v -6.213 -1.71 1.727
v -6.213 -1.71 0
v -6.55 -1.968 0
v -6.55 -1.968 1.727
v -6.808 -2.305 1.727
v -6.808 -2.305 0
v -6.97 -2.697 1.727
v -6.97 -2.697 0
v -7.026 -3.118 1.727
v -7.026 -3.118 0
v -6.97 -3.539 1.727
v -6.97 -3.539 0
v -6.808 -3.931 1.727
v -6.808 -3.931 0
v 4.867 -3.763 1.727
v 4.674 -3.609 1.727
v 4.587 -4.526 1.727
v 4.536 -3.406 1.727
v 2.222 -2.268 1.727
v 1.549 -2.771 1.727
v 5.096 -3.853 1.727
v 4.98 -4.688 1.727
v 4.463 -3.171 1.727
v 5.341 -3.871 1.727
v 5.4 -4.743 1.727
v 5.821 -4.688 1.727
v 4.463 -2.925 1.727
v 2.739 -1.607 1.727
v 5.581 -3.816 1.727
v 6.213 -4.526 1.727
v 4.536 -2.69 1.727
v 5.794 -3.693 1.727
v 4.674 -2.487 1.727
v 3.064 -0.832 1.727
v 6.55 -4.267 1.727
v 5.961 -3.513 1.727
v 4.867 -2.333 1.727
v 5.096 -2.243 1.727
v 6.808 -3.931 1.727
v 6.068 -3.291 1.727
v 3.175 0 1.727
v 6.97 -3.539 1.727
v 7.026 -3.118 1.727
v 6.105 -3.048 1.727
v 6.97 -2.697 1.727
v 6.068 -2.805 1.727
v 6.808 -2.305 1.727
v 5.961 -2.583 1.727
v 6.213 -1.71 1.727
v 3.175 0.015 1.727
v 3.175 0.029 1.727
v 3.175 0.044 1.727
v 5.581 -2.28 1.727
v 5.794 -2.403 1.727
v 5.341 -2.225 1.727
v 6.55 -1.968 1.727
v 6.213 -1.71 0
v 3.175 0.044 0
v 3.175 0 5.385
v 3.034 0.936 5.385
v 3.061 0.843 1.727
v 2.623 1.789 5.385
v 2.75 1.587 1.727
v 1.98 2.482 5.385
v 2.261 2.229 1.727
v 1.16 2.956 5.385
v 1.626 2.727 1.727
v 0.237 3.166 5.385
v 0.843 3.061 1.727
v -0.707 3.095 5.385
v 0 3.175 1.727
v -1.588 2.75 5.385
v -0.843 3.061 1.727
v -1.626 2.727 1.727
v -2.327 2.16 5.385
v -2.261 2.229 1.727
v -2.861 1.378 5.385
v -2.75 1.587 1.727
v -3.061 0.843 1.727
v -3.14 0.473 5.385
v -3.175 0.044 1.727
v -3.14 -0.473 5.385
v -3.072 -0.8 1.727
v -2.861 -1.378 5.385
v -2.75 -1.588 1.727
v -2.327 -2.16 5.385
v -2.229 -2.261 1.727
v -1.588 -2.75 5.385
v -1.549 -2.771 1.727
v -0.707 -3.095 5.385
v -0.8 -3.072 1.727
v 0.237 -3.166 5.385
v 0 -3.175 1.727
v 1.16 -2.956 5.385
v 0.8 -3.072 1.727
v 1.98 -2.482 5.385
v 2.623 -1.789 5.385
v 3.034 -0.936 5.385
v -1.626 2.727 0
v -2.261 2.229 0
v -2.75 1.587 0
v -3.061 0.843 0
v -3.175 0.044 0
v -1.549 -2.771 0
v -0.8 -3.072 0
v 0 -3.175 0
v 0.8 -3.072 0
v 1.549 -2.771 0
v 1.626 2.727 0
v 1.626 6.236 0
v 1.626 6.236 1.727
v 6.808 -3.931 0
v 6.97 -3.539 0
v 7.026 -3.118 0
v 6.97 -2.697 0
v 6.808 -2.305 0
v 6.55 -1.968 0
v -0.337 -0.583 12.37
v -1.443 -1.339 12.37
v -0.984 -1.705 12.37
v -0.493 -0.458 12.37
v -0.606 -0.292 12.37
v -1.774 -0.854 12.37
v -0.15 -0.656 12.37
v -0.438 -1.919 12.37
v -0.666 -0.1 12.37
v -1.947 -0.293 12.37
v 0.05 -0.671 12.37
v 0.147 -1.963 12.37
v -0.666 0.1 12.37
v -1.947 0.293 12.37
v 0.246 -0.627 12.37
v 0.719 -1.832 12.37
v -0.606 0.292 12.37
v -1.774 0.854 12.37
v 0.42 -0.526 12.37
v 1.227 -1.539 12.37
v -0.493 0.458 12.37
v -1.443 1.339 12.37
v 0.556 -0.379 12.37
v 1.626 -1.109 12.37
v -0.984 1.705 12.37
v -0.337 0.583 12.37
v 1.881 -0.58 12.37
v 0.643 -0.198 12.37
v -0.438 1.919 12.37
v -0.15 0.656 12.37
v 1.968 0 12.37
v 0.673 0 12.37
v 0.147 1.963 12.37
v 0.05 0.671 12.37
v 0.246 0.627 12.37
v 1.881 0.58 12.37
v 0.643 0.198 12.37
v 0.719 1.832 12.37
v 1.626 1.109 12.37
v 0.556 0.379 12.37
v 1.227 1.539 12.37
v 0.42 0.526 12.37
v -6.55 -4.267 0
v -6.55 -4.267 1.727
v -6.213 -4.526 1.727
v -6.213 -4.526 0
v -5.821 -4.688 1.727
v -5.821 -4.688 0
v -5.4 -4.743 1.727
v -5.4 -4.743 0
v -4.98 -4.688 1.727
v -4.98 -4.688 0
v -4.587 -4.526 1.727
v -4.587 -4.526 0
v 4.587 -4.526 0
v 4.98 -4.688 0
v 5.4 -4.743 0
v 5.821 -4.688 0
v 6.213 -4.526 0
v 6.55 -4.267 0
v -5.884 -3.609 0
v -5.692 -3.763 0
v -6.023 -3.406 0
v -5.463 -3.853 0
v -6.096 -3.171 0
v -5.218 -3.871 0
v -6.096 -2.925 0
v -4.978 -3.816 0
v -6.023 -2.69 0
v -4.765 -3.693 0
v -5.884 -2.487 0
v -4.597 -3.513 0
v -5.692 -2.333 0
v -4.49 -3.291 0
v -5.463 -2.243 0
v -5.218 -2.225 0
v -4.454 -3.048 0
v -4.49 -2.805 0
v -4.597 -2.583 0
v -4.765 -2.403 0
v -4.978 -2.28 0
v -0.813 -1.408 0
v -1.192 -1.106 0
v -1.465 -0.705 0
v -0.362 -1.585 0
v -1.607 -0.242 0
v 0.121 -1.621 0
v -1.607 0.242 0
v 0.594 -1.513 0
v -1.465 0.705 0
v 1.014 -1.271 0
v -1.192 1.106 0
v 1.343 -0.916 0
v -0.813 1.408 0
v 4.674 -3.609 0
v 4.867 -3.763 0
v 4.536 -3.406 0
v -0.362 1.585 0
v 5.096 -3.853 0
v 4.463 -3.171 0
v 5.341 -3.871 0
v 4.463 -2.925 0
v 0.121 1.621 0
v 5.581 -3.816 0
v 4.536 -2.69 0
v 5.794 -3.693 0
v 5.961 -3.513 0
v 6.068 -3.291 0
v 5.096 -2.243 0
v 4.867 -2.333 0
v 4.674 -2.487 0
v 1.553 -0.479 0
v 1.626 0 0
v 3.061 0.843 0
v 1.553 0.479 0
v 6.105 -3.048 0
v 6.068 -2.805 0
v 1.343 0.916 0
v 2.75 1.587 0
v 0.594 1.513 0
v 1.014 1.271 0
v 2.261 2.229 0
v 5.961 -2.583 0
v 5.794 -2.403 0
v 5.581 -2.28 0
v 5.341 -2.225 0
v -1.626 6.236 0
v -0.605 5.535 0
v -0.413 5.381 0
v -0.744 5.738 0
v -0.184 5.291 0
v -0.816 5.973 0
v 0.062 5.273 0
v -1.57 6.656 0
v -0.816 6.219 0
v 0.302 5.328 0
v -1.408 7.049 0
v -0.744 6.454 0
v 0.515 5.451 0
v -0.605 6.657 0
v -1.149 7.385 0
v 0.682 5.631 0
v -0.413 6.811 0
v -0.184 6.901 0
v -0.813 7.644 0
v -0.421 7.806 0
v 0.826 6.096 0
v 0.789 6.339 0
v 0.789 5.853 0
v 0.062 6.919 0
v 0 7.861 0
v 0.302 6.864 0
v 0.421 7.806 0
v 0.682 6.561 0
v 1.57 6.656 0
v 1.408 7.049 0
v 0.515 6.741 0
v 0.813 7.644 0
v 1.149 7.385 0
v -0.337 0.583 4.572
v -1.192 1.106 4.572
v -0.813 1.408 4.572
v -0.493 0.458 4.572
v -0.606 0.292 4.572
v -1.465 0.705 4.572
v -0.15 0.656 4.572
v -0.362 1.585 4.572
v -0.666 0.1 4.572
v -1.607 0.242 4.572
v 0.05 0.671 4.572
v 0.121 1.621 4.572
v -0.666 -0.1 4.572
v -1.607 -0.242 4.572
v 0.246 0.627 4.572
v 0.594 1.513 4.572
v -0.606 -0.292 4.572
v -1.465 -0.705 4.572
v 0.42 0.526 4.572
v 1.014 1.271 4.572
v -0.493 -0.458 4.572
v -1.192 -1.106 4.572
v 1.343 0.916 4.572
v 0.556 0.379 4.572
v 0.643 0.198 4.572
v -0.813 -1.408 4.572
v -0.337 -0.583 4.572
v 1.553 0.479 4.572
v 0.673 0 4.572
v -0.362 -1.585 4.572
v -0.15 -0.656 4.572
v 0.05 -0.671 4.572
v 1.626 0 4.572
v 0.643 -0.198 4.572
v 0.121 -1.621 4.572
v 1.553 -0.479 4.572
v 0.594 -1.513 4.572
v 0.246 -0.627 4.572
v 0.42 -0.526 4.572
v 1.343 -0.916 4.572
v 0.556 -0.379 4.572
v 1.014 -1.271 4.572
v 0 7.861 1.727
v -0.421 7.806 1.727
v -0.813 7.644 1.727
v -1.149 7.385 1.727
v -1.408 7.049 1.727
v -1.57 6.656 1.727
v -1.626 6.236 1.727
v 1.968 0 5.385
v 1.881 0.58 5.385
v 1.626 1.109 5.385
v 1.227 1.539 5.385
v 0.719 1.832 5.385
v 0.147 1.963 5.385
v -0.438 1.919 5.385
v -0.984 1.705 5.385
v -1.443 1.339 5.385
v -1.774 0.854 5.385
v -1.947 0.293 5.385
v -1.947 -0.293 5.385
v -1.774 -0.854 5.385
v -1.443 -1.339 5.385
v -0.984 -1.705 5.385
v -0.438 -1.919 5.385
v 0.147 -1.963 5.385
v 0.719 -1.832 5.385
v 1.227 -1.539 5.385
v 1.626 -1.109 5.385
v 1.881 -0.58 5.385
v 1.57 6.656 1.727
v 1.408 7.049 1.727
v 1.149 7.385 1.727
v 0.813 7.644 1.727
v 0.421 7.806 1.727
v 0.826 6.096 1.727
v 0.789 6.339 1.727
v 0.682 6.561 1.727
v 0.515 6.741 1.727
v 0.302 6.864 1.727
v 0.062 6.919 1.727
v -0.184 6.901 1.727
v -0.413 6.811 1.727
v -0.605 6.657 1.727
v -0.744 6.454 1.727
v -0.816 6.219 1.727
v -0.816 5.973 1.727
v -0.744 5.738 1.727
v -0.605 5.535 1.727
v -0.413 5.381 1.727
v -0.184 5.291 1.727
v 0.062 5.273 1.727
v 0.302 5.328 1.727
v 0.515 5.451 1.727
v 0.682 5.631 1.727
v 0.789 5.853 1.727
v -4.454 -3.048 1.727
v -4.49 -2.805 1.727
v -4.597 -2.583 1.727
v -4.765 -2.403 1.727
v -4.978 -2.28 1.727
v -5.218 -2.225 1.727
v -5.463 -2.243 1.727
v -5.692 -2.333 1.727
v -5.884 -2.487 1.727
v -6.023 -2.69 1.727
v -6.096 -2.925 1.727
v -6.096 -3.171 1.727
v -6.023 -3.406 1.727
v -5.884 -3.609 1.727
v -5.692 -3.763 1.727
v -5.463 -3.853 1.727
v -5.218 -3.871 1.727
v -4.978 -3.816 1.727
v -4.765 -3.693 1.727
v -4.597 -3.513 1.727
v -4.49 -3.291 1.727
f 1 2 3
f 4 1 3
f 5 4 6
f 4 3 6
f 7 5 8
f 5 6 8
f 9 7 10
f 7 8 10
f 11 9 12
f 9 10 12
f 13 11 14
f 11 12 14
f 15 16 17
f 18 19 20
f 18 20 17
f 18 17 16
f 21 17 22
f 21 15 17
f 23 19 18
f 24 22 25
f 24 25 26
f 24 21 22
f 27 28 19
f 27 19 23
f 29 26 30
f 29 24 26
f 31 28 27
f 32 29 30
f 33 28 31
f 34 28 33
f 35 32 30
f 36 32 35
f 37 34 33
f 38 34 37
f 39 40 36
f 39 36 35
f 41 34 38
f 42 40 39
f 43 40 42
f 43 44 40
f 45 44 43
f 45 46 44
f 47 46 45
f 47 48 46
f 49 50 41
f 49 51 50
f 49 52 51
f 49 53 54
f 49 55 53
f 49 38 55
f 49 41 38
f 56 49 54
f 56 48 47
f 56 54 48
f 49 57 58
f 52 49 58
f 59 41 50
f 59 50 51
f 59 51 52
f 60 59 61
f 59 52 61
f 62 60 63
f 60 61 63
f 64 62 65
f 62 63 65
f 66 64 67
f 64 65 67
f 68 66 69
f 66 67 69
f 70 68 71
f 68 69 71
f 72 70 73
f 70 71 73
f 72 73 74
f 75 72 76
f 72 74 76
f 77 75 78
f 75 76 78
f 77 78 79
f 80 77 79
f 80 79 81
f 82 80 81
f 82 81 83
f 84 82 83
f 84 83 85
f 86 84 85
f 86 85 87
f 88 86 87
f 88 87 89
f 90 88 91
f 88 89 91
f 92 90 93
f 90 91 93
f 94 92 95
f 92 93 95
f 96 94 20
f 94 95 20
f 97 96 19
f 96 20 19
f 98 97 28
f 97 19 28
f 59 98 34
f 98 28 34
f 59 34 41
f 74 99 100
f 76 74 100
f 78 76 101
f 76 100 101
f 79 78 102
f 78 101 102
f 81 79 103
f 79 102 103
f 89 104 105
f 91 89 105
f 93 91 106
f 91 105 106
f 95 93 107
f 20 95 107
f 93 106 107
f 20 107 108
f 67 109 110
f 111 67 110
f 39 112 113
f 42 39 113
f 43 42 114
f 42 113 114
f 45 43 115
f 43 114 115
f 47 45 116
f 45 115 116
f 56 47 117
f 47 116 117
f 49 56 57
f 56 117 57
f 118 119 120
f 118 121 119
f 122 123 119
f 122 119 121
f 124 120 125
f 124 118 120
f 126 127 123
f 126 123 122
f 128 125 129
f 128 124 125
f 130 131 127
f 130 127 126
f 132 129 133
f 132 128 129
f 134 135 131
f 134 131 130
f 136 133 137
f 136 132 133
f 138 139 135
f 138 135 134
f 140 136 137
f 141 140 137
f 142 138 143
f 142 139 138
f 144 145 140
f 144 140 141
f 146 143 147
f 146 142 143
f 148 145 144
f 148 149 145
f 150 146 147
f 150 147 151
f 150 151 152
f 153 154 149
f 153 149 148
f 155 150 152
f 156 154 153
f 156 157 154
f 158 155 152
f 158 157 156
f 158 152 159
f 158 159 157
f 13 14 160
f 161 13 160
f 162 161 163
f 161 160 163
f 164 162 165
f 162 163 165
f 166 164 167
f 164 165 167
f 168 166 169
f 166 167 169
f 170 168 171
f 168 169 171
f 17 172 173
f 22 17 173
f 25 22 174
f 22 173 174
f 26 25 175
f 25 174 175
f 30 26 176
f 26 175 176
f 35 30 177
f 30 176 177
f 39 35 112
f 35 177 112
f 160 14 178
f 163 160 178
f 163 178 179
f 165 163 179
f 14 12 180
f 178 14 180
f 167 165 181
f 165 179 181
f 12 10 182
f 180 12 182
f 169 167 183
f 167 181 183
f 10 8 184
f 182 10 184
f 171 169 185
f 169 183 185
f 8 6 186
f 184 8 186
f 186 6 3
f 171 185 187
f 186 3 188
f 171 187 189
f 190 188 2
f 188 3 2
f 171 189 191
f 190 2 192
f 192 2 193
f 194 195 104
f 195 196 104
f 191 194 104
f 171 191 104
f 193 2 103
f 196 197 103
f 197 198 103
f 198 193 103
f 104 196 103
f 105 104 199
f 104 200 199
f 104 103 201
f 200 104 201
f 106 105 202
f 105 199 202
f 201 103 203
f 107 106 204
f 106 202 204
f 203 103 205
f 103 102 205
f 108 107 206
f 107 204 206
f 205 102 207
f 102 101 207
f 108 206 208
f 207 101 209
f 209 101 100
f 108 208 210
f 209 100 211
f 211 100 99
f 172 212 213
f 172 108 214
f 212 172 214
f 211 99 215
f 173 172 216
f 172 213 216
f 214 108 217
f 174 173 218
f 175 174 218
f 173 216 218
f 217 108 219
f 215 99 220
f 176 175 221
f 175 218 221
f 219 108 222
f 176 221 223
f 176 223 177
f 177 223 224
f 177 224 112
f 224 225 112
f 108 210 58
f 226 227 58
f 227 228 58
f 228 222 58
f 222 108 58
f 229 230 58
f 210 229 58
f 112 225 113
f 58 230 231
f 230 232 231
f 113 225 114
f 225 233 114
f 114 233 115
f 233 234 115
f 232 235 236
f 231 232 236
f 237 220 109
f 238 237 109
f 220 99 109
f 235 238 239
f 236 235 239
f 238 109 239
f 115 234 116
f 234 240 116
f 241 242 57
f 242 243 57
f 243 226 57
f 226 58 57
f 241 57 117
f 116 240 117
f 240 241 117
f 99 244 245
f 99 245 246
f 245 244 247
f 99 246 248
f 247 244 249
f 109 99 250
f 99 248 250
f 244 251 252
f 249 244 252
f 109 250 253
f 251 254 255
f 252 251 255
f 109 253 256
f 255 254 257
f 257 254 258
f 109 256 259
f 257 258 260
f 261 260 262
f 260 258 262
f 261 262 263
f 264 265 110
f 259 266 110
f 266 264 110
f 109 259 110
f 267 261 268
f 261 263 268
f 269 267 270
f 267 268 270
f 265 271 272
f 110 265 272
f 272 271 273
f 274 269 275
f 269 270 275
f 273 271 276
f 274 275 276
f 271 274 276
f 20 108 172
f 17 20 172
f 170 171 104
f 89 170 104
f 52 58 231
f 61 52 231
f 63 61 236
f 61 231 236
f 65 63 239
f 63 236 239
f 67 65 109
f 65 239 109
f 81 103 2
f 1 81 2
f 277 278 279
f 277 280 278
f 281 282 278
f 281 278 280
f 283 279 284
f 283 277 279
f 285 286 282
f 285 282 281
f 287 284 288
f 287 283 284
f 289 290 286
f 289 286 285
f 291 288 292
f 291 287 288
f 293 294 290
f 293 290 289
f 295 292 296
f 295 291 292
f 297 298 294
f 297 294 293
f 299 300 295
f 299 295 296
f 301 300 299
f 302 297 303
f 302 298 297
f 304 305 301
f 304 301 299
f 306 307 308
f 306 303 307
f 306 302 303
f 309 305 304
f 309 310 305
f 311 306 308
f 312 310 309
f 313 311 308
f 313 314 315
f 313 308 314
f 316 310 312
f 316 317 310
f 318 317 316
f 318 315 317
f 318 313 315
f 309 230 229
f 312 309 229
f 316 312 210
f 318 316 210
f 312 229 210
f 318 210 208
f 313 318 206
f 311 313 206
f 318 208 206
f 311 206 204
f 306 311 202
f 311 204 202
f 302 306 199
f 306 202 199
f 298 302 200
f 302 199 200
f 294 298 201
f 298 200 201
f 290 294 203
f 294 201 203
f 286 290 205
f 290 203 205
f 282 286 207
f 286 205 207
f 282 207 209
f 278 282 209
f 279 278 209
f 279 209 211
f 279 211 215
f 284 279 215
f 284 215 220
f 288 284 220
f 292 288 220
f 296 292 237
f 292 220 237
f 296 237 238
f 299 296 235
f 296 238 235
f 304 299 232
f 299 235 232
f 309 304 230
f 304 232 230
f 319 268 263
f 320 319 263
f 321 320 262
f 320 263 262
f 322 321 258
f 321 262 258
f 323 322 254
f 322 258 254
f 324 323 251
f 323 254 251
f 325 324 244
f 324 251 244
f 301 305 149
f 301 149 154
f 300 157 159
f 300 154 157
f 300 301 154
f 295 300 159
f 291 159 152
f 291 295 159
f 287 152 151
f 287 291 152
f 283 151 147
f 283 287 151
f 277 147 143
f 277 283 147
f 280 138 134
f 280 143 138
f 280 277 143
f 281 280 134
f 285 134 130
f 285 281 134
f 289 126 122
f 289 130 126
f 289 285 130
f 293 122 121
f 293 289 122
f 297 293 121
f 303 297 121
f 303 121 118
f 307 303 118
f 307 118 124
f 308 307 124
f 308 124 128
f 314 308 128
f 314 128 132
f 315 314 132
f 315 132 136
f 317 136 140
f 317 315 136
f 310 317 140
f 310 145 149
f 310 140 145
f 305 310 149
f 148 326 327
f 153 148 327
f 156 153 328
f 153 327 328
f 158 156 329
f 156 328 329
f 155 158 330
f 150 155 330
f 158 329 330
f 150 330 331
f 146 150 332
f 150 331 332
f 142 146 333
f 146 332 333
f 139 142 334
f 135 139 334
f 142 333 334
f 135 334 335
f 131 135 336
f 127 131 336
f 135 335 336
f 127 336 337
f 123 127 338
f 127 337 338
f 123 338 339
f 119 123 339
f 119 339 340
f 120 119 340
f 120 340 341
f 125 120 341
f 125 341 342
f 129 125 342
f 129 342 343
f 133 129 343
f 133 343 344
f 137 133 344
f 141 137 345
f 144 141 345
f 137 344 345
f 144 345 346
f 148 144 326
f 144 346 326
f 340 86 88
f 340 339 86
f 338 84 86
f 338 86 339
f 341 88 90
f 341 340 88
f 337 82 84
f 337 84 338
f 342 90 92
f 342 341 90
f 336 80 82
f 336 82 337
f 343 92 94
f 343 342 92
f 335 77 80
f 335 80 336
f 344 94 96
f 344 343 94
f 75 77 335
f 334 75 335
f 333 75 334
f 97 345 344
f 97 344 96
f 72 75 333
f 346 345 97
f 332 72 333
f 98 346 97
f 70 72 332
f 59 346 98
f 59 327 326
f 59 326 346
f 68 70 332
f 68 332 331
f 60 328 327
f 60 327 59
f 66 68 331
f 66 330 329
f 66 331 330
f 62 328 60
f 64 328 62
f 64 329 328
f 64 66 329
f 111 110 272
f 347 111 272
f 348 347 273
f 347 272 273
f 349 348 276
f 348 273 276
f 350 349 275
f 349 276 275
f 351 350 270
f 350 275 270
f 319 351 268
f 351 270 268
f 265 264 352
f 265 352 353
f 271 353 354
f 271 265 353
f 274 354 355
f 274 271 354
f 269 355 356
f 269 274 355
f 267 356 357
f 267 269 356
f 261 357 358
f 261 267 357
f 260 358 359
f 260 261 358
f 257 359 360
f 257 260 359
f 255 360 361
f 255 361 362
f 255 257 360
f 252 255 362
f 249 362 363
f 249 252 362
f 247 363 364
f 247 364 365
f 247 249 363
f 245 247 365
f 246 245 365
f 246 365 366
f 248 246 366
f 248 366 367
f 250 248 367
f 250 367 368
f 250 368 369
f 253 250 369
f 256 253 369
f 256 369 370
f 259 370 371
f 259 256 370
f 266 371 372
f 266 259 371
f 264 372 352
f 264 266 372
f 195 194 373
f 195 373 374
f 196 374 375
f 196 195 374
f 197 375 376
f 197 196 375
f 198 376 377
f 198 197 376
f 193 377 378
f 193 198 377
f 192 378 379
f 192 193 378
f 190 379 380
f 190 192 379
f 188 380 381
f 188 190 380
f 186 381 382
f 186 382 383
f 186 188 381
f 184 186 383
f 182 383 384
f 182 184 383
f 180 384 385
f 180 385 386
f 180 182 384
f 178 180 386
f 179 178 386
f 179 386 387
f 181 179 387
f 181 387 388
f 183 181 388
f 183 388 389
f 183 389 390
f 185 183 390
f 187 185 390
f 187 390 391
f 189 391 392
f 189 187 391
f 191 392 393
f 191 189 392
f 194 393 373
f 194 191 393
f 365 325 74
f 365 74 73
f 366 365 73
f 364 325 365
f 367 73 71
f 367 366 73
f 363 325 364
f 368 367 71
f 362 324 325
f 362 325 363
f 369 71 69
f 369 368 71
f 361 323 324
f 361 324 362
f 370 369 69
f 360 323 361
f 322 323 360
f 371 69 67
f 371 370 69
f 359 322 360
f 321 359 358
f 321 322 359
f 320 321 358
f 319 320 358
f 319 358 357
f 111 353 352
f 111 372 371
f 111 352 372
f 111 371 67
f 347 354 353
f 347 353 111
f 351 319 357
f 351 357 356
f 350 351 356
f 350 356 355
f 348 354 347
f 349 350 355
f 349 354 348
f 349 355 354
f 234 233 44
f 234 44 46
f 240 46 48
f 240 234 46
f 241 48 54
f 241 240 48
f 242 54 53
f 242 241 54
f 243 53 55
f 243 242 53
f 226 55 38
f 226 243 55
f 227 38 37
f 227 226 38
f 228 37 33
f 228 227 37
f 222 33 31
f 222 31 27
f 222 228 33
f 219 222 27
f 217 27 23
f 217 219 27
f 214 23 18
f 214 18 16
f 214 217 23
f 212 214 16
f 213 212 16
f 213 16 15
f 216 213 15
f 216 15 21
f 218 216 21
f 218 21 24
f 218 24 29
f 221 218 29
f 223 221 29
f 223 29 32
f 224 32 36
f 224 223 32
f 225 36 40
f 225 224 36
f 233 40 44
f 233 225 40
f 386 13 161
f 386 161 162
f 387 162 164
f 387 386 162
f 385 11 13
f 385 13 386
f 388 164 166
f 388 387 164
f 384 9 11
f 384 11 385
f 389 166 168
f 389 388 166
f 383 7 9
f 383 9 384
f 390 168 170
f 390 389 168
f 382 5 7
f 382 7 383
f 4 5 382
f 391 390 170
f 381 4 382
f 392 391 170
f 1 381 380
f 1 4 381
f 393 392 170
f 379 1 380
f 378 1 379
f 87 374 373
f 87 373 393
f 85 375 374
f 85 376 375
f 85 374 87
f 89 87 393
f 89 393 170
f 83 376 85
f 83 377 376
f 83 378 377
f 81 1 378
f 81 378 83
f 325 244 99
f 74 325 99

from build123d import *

# Parameters (mm, degrees)
F0_R     = 0.8255
F1_DEPTH = 1.7272
F2_R     = 3.175
F3_DEPTH = 3.6576
F4_R     = 1.9685
F5_DEPTH = 6.985
F6_R     = 0.6731
F7_DEPTH = 12.3708
F8_R     = 1.6256
F9_DEPTH = 4.572


with BuildPart() as f1:
    # F0 (on Top) → F1 (new body)
    with BuildSketch(Plane.XY):
        with BuildLine():
            ThreePointArc((-1.549093, -2.77145), (0, -3.175), (1.549093, -2.77145))
            Line((1.549093, -2.77145), (4.587475, -4.525661))
            ThreePointArc((4.587475, -4.525661), (5.821011, -4.688059), (6.808086, -3.93065))
            ThreePointArc((6.808086, -3.93065), (6.970484, -2.697114), (6.213075, -1.710039))
            Line((6.213075, -1.710039), (3.174693, 0.044171))
            ThreePointArc((3.174693, 0.044171), (2.749631, 1.5875), (1.6256, 2.727279))
            Line((1.6256, 2.727279), (1.6256, 6.2357))
            ThreePointArc((1.6256, 6.2357), (1.149473, 7.385173), (0, 7.8613))
            ThreePointArc((0, 7.8613), (-1.149473, 7.385173), (-1.6256, 6.2357))
            Line((-1.6256, 6.2357), (-1.6256, 2.727279))
            ThreePointArc((-1.6256, 2.727279), (-2.749631, 1.5875), (-3.174693, 0.044171))
            Line((-3.174693, 0.044171), (-6.213075, -1.710039))
            ThreePointArc((-6.213075, -1.710039), (-6.970484, -2.697114), (-6.808086, -3.93065))
            ThreePointArc((-6.808086, -3.93065), (-5.821011, -4.688059), (-4.587475, -4.525661))
            Line((-4.587475, -4.525661), (-1.549093, -2.77145))
        make_face()
        with Locations((-5.279291, -3.048)):
            Circle(F0_R, mode=Mode.SUBTRACT)
        with Locations((5.279291, -3.048)):
            Circle(F0_R, mode=Mode.SUBTRACT)
        with Locations((0, 6.096)):
            Circle(F0_R, mode=Mode.SUBTRACT)
    extrude(amount=F1_DEPTH)

    # F2 (on face) → F3 (join)
    with BuildSketch(Plane.XY.offset(1.7272)):
        Circle(F2_R)
    extrude(amount=F3_DEPTH)

    # F4 (on face) → F5 (join)
    with BuildSketch(Plane.XY.offset(5.3848)):
        Circle(F4_R)
    extrude(amount=F5_DEPTH)

    # F6 (on Top) → F7 (cut, through all)
    with BuildSketch(Plane.XY):
        Circle(F6_R)
    extrude(amount=F7_DEPTH, mode=Mode.SUBTRACT)

    # F8 (on face) → F9 (cut)
    with BuildSketch(Plane(origin=(0, 0, 0), x_dir=(1, 0, 0), z_dir=(0, 0, -1))):
        Circle(F8_R)
    extrude(amount=-F9_DEPTH, mode=Mode.SUBTRACT)


solid = f1.part
